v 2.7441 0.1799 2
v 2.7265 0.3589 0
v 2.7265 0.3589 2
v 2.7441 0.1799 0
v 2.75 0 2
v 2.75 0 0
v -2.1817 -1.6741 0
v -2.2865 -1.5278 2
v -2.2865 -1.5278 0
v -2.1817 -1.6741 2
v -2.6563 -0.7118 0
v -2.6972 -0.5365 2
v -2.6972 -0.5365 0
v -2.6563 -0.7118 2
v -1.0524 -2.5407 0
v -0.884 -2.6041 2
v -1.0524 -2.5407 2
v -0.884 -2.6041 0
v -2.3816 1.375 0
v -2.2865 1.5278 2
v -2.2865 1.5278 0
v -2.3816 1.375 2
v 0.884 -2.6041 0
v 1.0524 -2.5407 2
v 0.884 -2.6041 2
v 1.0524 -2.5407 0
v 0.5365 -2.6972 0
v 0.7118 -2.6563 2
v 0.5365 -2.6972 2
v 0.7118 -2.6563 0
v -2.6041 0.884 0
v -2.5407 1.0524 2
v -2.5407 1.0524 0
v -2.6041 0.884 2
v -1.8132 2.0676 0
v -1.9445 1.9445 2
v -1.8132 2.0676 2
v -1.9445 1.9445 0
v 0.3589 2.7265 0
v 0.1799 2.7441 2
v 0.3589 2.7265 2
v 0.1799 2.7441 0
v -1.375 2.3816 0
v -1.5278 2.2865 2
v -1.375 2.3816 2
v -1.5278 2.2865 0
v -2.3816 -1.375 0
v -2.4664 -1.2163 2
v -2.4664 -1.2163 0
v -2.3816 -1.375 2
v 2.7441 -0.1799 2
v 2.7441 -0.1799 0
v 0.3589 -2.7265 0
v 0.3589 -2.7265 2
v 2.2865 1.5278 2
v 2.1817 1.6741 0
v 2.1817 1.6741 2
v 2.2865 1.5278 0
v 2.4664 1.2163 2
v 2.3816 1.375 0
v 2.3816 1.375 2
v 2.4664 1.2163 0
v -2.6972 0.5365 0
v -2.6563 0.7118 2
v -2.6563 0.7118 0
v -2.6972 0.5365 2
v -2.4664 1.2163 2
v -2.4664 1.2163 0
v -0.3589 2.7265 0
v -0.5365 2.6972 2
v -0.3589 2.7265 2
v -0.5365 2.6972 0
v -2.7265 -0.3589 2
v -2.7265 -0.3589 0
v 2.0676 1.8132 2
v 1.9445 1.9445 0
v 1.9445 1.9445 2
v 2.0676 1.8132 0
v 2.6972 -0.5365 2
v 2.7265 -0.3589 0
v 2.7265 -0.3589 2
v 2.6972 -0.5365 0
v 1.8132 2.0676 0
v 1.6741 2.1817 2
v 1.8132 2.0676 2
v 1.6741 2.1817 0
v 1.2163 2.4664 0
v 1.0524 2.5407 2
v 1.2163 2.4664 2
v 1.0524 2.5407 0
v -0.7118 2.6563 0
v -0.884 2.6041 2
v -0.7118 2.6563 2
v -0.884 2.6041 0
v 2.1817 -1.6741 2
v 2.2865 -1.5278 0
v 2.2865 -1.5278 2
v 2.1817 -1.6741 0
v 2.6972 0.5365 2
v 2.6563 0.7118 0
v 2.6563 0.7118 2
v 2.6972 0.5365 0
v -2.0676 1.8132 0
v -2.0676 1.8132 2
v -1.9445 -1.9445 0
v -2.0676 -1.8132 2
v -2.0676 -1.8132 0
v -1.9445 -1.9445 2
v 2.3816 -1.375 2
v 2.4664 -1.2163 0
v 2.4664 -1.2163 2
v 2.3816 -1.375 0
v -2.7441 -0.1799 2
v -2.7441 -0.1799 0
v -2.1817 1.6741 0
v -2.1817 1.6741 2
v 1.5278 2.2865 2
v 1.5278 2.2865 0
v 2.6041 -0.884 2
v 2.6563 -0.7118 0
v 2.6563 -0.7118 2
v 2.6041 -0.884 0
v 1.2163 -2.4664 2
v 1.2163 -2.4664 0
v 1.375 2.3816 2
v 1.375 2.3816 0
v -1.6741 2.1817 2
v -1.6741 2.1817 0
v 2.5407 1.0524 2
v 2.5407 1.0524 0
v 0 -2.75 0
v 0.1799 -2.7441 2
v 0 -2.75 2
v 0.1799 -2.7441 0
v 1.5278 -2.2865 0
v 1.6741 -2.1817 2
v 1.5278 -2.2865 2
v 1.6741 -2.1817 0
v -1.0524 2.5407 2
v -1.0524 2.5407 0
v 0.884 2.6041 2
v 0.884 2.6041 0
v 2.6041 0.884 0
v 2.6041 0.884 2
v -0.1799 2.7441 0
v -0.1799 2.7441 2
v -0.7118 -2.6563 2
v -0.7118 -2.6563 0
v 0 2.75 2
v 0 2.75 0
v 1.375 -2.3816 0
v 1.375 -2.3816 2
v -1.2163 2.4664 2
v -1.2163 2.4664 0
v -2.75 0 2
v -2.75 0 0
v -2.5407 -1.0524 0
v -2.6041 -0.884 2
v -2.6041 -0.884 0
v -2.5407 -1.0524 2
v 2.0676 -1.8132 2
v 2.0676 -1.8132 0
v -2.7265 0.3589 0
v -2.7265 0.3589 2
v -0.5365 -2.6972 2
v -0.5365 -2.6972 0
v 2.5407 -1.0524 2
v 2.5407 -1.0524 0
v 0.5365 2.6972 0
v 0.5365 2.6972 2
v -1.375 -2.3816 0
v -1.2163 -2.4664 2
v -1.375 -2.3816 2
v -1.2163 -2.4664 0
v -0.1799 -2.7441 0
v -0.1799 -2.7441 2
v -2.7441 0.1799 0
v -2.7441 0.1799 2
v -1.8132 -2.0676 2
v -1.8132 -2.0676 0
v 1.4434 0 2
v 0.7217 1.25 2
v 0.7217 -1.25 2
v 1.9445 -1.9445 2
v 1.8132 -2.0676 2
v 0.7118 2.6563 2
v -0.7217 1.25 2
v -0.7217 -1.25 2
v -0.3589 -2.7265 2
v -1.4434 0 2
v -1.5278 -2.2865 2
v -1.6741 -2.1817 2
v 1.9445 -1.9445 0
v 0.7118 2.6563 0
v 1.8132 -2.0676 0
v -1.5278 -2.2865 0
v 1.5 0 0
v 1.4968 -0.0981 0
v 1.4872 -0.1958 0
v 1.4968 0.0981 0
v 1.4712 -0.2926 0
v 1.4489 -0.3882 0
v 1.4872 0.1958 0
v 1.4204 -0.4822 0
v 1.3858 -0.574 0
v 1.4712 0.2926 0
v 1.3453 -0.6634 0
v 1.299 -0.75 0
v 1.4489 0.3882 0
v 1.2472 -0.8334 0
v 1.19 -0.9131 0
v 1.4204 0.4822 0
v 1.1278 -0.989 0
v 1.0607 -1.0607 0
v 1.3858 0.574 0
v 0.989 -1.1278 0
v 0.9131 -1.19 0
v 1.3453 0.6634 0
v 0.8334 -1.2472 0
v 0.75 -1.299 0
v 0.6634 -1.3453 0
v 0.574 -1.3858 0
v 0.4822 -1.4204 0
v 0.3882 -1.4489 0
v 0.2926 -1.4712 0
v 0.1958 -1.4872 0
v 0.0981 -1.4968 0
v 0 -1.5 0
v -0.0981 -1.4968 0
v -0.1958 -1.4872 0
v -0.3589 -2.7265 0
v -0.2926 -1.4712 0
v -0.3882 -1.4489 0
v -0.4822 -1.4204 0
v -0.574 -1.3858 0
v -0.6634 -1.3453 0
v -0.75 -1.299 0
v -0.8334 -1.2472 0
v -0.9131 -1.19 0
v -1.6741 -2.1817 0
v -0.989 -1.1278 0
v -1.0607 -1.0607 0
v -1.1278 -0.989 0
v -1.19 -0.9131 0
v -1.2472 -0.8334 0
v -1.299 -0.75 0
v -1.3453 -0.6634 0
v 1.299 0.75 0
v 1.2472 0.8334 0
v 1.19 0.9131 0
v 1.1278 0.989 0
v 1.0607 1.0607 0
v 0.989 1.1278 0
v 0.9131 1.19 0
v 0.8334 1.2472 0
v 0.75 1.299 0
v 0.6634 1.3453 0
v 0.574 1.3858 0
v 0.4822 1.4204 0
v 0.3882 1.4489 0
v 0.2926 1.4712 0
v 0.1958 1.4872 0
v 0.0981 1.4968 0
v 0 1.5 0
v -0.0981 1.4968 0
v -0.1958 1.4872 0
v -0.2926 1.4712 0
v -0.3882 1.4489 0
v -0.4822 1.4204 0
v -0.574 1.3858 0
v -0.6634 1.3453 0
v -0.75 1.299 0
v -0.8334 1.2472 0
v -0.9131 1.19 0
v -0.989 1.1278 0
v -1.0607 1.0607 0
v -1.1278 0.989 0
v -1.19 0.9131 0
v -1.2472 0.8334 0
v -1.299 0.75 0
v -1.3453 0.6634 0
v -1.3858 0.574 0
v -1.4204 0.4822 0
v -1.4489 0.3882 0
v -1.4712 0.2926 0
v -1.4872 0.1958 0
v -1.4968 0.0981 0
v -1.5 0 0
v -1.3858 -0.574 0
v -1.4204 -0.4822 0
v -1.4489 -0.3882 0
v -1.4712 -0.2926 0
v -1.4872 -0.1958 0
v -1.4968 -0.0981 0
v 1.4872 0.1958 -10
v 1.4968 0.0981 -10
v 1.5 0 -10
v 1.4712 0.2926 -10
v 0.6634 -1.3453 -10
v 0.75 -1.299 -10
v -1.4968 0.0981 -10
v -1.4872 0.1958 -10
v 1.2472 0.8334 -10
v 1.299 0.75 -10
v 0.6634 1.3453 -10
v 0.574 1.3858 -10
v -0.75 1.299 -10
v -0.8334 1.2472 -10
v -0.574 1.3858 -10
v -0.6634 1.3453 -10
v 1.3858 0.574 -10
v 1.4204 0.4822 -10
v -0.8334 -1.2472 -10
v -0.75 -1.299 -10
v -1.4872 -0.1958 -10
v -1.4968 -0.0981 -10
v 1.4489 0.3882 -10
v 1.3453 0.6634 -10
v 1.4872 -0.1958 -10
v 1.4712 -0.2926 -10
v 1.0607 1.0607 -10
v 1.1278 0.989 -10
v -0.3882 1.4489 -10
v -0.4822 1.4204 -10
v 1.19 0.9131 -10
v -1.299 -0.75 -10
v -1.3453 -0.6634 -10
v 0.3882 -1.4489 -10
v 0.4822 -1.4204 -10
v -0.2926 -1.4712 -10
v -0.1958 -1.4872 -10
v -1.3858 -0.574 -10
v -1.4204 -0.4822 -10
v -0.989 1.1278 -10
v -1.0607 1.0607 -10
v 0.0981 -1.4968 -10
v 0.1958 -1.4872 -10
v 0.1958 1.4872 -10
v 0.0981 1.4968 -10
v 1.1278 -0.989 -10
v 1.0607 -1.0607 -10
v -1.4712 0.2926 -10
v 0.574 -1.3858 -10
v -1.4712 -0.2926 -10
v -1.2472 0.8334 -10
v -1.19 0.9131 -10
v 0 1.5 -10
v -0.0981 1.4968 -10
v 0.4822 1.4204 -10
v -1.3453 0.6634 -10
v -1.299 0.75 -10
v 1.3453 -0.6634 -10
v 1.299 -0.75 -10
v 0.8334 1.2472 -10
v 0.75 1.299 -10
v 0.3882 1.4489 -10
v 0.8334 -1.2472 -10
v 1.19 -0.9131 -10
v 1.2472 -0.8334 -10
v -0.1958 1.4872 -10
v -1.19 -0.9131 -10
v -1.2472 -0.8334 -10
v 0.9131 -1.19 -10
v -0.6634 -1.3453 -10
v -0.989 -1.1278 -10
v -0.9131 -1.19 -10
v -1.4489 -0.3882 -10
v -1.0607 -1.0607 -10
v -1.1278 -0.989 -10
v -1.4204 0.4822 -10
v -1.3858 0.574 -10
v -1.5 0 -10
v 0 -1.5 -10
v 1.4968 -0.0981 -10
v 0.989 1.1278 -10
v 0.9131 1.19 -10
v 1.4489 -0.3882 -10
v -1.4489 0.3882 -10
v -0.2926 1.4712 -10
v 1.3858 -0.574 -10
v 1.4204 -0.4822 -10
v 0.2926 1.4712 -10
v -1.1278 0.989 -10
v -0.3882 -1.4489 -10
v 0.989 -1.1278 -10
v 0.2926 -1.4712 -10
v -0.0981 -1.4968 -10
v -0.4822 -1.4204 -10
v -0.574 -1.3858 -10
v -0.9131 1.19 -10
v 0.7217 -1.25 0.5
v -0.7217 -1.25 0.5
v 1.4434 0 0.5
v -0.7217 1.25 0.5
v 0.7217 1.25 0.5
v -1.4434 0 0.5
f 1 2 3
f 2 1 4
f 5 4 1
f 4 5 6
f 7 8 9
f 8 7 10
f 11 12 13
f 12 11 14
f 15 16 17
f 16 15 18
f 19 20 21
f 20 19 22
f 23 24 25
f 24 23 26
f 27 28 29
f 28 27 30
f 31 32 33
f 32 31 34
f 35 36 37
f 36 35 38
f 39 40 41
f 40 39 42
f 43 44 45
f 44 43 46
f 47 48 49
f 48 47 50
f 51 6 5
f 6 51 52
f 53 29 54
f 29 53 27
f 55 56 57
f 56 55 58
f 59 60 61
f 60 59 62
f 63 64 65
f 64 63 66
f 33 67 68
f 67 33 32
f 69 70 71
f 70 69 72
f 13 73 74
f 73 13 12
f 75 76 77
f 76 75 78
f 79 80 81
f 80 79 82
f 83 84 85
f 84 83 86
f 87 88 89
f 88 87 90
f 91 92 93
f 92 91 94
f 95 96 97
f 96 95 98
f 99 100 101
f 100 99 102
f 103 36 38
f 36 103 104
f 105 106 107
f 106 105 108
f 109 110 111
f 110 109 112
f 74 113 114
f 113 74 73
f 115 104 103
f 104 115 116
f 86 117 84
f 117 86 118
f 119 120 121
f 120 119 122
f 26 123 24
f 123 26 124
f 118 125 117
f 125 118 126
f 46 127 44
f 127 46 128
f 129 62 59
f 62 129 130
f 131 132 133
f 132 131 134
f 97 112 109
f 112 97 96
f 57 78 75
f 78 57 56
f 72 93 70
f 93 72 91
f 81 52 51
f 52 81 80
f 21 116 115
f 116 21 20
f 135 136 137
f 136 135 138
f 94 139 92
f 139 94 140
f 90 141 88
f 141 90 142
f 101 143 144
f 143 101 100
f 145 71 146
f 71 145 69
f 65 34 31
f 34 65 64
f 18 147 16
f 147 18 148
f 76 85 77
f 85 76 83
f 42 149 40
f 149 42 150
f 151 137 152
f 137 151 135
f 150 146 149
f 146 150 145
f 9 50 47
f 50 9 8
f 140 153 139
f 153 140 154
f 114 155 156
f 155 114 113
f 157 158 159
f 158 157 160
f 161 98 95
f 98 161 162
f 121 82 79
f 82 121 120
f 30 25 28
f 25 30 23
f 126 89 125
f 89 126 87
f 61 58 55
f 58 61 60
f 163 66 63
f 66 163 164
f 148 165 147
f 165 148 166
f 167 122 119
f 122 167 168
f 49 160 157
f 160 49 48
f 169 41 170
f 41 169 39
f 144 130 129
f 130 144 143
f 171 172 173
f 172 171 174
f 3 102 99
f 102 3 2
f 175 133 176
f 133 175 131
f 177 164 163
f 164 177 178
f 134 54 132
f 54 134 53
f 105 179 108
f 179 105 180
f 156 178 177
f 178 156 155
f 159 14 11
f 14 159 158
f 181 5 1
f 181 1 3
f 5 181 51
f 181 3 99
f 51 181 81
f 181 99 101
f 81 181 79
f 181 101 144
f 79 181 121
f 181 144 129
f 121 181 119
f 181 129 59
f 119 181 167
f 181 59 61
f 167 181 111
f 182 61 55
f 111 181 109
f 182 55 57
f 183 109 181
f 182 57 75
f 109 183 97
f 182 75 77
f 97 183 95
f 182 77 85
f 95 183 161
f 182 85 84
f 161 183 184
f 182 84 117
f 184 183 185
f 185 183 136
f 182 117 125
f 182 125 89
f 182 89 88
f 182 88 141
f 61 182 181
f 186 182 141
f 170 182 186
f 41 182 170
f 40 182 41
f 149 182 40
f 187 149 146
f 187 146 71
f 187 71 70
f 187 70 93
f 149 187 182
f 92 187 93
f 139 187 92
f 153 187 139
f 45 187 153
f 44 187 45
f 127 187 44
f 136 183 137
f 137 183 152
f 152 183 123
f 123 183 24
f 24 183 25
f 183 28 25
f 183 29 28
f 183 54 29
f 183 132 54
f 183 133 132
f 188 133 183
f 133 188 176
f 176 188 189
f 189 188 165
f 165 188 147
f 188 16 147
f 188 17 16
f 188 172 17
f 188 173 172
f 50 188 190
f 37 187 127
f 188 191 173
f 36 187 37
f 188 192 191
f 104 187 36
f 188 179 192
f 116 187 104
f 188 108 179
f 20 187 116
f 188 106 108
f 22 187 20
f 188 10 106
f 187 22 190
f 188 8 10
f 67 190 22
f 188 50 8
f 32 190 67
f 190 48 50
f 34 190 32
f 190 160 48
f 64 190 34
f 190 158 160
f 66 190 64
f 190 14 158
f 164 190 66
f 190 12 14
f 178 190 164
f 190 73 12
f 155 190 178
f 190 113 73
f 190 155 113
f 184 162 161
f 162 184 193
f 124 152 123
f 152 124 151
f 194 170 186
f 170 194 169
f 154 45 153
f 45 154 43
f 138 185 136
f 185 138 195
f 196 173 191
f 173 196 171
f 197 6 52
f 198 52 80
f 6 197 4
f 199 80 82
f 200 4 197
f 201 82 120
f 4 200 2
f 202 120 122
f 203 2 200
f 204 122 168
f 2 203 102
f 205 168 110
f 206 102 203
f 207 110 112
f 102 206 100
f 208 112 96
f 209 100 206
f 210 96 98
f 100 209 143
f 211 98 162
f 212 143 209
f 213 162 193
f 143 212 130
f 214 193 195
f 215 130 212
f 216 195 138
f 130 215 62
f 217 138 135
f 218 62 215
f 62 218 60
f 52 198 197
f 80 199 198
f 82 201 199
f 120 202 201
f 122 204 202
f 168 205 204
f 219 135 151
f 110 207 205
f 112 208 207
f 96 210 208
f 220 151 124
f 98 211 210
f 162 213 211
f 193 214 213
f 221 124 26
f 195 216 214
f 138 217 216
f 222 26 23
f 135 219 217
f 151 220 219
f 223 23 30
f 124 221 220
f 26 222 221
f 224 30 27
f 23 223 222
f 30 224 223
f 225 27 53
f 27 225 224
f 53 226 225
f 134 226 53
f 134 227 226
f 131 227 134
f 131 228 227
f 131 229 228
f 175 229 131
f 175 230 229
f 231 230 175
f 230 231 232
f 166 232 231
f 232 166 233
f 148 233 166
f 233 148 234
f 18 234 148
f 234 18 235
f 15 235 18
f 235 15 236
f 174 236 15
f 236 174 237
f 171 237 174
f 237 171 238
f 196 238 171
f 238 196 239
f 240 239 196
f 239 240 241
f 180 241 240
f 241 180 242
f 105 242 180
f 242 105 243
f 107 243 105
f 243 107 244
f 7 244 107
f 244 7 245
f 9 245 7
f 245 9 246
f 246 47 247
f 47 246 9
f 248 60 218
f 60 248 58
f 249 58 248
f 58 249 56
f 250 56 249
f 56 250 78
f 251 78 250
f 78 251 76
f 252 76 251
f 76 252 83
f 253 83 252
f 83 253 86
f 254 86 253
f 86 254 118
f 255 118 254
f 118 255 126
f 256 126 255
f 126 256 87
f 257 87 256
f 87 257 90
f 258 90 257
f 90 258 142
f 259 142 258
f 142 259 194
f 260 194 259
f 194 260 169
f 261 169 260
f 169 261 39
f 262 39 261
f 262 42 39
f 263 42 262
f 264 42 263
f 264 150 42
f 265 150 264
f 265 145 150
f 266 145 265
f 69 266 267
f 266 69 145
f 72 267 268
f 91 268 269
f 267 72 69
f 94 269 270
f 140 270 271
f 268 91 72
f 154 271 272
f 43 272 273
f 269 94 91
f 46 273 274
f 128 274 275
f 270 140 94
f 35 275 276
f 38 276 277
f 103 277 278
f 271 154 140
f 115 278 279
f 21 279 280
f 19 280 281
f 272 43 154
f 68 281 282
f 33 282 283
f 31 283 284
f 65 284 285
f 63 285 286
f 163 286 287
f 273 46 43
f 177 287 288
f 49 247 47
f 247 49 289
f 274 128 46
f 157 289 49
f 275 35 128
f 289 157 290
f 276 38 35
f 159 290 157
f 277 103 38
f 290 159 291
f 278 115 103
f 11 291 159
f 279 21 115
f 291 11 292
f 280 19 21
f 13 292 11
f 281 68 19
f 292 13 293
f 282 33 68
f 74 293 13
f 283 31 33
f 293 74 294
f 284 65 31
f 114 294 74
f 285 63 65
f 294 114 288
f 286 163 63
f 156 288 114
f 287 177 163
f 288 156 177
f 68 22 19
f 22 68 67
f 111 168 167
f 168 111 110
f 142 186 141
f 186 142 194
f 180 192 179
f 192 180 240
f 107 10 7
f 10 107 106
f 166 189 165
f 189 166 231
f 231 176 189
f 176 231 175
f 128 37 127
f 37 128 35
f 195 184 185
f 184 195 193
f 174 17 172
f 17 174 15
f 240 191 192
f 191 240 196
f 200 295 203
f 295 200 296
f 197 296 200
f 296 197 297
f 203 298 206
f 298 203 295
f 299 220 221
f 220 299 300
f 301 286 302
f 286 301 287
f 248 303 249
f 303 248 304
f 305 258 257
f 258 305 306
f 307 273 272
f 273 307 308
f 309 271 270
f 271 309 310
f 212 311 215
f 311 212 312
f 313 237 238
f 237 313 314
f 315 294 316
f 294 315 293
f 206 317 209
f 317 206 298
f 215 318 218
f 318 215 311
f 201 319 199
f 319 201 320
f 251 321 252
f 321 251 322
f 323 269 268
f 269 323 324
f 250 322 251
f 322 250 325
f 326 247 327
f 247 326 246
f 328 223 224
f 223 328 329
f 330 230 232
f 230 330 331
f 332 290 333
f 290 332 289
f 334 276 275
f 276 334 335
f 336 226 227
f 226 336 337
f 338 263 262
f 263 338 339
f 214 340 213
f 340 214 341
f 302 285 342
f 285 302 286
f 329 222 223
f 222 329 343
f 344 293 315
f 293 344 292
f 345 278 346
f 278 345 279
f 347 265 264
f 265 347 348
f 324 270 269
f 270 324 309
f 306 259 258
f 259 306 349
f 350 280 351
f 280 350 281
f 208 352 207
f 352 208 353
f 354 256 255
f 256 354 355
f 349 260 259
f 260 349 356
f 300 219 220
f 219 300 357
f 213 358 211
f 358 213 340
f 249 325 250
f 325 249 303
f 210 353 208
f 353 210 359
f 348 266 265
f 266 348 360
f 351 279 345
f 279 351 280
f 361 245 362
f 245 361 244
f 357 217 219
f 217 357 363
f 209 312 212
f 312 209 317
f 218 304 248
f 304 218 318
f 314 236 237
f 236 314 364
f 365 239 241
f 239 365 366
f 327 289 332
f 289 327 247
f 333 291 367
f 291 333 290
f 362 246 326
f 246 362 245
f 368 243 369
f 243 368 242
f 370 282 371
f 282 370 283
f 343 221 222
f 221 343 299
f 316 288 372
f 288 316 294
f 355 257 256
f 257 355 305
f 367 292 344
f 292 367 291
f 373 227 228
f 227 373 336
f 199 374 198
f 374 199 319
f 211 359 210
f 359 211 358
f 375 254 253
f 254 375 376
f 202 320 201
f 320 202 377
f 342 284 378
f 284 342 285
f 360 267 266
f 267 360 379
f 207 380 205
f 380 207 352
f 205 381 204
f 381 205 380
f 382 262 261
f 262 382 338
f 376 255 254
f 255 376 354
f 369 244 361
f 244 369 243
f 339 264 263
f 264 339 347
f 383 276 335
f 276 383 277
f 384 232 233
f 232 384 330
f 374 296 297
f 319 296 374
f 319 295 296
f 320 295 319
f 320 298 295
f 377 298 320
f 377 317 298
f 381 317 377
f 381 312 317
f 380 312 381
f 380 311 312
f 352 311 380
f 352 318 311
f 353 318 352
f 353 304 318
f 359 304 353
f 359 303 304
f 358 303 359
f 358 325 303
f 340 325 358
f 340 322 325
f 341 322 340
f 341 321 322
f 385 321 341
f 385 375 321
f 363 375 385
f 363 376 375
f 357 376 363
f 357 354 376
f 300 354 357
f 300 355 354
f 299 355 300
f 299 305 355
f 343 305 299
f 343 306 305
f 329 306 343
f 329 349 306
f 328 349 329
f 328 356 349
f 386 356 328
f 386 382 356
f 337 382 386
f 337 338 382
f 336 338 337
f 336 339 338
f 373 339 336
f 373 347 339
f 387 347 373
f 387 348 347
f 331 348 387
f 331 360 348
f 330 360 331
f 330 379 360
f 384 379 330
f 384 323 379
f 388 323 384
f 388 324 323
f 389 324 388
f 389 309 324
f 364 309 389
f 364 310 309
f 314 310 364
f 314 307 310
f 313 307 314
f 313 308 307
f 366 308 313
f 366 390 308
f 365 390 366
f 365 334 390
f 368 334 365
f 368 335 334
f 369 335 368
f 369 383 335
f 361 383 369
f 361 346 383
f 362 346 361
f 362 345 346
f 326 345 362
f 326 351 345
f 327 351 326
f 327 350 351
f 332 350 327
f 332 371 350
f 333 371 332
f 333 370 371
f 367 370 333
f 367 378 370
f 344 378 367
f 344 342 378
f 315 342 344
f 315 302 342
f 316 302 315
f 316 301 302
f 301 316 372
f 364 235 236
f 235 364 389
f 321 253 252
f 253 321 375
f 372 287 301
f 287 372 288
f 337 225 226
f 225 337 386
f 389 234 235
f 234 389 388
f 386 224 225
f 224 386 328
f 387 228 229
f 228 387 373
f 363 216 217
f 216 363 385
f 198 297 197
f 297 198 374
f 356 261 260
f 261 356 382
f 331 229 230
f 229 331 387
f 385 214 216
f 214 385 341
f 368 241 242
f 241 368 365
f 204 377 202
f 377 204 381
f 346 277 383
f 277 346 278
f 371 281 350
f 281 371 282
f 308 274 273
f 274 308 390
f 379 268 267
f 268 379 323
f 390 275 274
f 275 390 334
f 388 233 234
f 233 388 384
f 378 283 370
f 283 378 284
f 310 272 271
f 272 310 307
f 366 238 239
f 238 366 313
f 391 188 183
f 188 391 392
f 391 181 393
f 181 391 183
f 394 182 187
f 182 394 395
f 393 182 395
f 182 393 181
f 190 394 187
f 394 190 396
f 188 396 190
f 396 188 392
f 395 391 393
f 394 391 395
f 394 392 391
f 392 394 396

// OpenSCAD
// Socket head cap screw (M3 x 10) with hex recess
// Requested: 3.0mm shank diameter, 5.5mm head diameter, 2.0mm head height, 10mm long

thread_diameter_mm   = 3.0;
length_mm            = 10.0;   // under-head length
head_diameter_mm     = 5.5;
head_height_mm       = 2.0;

// Typical M3 socket: 2.5mm across flats, ~1.5mm deep (as provided)
hex_socket_af_mm     = 2.5;
hex_socket_depth_mm  = 1.5;

$fn = 96;

module socket_head_cap_screw() {
    head_r = head_diameter_mm/2;
    shank_r = thread_diameter_mm/2;

    // Place underside of head at z=0, head on +Z, shank on -Z
    difference() {
        union() {
            // Head
            translate([0, 0, head_height_mm/2])
                cylinder(r=head_r, h=head_height_mm, center=true);

            // Shank (under-head length)
            translate([0, 0, -length_mm/2])
                cylinder(r=shank_r, h=length_mm, center=true);
        }

        // Hex socket recess cut from top of head
        // Hex cylinder radius for given across-flats: R = AF / (2*cos(30))
        hex_R = hex_socket_af_mm / (2*cos(30));
        translate([0, 0, head_height_mm - hex_socket_depth_mm/2])
            cylinder(r=hex_R, h=hex_socket_depth_mm, center=true, $fn=6);
    }
}

socket_head_cap_screw();
